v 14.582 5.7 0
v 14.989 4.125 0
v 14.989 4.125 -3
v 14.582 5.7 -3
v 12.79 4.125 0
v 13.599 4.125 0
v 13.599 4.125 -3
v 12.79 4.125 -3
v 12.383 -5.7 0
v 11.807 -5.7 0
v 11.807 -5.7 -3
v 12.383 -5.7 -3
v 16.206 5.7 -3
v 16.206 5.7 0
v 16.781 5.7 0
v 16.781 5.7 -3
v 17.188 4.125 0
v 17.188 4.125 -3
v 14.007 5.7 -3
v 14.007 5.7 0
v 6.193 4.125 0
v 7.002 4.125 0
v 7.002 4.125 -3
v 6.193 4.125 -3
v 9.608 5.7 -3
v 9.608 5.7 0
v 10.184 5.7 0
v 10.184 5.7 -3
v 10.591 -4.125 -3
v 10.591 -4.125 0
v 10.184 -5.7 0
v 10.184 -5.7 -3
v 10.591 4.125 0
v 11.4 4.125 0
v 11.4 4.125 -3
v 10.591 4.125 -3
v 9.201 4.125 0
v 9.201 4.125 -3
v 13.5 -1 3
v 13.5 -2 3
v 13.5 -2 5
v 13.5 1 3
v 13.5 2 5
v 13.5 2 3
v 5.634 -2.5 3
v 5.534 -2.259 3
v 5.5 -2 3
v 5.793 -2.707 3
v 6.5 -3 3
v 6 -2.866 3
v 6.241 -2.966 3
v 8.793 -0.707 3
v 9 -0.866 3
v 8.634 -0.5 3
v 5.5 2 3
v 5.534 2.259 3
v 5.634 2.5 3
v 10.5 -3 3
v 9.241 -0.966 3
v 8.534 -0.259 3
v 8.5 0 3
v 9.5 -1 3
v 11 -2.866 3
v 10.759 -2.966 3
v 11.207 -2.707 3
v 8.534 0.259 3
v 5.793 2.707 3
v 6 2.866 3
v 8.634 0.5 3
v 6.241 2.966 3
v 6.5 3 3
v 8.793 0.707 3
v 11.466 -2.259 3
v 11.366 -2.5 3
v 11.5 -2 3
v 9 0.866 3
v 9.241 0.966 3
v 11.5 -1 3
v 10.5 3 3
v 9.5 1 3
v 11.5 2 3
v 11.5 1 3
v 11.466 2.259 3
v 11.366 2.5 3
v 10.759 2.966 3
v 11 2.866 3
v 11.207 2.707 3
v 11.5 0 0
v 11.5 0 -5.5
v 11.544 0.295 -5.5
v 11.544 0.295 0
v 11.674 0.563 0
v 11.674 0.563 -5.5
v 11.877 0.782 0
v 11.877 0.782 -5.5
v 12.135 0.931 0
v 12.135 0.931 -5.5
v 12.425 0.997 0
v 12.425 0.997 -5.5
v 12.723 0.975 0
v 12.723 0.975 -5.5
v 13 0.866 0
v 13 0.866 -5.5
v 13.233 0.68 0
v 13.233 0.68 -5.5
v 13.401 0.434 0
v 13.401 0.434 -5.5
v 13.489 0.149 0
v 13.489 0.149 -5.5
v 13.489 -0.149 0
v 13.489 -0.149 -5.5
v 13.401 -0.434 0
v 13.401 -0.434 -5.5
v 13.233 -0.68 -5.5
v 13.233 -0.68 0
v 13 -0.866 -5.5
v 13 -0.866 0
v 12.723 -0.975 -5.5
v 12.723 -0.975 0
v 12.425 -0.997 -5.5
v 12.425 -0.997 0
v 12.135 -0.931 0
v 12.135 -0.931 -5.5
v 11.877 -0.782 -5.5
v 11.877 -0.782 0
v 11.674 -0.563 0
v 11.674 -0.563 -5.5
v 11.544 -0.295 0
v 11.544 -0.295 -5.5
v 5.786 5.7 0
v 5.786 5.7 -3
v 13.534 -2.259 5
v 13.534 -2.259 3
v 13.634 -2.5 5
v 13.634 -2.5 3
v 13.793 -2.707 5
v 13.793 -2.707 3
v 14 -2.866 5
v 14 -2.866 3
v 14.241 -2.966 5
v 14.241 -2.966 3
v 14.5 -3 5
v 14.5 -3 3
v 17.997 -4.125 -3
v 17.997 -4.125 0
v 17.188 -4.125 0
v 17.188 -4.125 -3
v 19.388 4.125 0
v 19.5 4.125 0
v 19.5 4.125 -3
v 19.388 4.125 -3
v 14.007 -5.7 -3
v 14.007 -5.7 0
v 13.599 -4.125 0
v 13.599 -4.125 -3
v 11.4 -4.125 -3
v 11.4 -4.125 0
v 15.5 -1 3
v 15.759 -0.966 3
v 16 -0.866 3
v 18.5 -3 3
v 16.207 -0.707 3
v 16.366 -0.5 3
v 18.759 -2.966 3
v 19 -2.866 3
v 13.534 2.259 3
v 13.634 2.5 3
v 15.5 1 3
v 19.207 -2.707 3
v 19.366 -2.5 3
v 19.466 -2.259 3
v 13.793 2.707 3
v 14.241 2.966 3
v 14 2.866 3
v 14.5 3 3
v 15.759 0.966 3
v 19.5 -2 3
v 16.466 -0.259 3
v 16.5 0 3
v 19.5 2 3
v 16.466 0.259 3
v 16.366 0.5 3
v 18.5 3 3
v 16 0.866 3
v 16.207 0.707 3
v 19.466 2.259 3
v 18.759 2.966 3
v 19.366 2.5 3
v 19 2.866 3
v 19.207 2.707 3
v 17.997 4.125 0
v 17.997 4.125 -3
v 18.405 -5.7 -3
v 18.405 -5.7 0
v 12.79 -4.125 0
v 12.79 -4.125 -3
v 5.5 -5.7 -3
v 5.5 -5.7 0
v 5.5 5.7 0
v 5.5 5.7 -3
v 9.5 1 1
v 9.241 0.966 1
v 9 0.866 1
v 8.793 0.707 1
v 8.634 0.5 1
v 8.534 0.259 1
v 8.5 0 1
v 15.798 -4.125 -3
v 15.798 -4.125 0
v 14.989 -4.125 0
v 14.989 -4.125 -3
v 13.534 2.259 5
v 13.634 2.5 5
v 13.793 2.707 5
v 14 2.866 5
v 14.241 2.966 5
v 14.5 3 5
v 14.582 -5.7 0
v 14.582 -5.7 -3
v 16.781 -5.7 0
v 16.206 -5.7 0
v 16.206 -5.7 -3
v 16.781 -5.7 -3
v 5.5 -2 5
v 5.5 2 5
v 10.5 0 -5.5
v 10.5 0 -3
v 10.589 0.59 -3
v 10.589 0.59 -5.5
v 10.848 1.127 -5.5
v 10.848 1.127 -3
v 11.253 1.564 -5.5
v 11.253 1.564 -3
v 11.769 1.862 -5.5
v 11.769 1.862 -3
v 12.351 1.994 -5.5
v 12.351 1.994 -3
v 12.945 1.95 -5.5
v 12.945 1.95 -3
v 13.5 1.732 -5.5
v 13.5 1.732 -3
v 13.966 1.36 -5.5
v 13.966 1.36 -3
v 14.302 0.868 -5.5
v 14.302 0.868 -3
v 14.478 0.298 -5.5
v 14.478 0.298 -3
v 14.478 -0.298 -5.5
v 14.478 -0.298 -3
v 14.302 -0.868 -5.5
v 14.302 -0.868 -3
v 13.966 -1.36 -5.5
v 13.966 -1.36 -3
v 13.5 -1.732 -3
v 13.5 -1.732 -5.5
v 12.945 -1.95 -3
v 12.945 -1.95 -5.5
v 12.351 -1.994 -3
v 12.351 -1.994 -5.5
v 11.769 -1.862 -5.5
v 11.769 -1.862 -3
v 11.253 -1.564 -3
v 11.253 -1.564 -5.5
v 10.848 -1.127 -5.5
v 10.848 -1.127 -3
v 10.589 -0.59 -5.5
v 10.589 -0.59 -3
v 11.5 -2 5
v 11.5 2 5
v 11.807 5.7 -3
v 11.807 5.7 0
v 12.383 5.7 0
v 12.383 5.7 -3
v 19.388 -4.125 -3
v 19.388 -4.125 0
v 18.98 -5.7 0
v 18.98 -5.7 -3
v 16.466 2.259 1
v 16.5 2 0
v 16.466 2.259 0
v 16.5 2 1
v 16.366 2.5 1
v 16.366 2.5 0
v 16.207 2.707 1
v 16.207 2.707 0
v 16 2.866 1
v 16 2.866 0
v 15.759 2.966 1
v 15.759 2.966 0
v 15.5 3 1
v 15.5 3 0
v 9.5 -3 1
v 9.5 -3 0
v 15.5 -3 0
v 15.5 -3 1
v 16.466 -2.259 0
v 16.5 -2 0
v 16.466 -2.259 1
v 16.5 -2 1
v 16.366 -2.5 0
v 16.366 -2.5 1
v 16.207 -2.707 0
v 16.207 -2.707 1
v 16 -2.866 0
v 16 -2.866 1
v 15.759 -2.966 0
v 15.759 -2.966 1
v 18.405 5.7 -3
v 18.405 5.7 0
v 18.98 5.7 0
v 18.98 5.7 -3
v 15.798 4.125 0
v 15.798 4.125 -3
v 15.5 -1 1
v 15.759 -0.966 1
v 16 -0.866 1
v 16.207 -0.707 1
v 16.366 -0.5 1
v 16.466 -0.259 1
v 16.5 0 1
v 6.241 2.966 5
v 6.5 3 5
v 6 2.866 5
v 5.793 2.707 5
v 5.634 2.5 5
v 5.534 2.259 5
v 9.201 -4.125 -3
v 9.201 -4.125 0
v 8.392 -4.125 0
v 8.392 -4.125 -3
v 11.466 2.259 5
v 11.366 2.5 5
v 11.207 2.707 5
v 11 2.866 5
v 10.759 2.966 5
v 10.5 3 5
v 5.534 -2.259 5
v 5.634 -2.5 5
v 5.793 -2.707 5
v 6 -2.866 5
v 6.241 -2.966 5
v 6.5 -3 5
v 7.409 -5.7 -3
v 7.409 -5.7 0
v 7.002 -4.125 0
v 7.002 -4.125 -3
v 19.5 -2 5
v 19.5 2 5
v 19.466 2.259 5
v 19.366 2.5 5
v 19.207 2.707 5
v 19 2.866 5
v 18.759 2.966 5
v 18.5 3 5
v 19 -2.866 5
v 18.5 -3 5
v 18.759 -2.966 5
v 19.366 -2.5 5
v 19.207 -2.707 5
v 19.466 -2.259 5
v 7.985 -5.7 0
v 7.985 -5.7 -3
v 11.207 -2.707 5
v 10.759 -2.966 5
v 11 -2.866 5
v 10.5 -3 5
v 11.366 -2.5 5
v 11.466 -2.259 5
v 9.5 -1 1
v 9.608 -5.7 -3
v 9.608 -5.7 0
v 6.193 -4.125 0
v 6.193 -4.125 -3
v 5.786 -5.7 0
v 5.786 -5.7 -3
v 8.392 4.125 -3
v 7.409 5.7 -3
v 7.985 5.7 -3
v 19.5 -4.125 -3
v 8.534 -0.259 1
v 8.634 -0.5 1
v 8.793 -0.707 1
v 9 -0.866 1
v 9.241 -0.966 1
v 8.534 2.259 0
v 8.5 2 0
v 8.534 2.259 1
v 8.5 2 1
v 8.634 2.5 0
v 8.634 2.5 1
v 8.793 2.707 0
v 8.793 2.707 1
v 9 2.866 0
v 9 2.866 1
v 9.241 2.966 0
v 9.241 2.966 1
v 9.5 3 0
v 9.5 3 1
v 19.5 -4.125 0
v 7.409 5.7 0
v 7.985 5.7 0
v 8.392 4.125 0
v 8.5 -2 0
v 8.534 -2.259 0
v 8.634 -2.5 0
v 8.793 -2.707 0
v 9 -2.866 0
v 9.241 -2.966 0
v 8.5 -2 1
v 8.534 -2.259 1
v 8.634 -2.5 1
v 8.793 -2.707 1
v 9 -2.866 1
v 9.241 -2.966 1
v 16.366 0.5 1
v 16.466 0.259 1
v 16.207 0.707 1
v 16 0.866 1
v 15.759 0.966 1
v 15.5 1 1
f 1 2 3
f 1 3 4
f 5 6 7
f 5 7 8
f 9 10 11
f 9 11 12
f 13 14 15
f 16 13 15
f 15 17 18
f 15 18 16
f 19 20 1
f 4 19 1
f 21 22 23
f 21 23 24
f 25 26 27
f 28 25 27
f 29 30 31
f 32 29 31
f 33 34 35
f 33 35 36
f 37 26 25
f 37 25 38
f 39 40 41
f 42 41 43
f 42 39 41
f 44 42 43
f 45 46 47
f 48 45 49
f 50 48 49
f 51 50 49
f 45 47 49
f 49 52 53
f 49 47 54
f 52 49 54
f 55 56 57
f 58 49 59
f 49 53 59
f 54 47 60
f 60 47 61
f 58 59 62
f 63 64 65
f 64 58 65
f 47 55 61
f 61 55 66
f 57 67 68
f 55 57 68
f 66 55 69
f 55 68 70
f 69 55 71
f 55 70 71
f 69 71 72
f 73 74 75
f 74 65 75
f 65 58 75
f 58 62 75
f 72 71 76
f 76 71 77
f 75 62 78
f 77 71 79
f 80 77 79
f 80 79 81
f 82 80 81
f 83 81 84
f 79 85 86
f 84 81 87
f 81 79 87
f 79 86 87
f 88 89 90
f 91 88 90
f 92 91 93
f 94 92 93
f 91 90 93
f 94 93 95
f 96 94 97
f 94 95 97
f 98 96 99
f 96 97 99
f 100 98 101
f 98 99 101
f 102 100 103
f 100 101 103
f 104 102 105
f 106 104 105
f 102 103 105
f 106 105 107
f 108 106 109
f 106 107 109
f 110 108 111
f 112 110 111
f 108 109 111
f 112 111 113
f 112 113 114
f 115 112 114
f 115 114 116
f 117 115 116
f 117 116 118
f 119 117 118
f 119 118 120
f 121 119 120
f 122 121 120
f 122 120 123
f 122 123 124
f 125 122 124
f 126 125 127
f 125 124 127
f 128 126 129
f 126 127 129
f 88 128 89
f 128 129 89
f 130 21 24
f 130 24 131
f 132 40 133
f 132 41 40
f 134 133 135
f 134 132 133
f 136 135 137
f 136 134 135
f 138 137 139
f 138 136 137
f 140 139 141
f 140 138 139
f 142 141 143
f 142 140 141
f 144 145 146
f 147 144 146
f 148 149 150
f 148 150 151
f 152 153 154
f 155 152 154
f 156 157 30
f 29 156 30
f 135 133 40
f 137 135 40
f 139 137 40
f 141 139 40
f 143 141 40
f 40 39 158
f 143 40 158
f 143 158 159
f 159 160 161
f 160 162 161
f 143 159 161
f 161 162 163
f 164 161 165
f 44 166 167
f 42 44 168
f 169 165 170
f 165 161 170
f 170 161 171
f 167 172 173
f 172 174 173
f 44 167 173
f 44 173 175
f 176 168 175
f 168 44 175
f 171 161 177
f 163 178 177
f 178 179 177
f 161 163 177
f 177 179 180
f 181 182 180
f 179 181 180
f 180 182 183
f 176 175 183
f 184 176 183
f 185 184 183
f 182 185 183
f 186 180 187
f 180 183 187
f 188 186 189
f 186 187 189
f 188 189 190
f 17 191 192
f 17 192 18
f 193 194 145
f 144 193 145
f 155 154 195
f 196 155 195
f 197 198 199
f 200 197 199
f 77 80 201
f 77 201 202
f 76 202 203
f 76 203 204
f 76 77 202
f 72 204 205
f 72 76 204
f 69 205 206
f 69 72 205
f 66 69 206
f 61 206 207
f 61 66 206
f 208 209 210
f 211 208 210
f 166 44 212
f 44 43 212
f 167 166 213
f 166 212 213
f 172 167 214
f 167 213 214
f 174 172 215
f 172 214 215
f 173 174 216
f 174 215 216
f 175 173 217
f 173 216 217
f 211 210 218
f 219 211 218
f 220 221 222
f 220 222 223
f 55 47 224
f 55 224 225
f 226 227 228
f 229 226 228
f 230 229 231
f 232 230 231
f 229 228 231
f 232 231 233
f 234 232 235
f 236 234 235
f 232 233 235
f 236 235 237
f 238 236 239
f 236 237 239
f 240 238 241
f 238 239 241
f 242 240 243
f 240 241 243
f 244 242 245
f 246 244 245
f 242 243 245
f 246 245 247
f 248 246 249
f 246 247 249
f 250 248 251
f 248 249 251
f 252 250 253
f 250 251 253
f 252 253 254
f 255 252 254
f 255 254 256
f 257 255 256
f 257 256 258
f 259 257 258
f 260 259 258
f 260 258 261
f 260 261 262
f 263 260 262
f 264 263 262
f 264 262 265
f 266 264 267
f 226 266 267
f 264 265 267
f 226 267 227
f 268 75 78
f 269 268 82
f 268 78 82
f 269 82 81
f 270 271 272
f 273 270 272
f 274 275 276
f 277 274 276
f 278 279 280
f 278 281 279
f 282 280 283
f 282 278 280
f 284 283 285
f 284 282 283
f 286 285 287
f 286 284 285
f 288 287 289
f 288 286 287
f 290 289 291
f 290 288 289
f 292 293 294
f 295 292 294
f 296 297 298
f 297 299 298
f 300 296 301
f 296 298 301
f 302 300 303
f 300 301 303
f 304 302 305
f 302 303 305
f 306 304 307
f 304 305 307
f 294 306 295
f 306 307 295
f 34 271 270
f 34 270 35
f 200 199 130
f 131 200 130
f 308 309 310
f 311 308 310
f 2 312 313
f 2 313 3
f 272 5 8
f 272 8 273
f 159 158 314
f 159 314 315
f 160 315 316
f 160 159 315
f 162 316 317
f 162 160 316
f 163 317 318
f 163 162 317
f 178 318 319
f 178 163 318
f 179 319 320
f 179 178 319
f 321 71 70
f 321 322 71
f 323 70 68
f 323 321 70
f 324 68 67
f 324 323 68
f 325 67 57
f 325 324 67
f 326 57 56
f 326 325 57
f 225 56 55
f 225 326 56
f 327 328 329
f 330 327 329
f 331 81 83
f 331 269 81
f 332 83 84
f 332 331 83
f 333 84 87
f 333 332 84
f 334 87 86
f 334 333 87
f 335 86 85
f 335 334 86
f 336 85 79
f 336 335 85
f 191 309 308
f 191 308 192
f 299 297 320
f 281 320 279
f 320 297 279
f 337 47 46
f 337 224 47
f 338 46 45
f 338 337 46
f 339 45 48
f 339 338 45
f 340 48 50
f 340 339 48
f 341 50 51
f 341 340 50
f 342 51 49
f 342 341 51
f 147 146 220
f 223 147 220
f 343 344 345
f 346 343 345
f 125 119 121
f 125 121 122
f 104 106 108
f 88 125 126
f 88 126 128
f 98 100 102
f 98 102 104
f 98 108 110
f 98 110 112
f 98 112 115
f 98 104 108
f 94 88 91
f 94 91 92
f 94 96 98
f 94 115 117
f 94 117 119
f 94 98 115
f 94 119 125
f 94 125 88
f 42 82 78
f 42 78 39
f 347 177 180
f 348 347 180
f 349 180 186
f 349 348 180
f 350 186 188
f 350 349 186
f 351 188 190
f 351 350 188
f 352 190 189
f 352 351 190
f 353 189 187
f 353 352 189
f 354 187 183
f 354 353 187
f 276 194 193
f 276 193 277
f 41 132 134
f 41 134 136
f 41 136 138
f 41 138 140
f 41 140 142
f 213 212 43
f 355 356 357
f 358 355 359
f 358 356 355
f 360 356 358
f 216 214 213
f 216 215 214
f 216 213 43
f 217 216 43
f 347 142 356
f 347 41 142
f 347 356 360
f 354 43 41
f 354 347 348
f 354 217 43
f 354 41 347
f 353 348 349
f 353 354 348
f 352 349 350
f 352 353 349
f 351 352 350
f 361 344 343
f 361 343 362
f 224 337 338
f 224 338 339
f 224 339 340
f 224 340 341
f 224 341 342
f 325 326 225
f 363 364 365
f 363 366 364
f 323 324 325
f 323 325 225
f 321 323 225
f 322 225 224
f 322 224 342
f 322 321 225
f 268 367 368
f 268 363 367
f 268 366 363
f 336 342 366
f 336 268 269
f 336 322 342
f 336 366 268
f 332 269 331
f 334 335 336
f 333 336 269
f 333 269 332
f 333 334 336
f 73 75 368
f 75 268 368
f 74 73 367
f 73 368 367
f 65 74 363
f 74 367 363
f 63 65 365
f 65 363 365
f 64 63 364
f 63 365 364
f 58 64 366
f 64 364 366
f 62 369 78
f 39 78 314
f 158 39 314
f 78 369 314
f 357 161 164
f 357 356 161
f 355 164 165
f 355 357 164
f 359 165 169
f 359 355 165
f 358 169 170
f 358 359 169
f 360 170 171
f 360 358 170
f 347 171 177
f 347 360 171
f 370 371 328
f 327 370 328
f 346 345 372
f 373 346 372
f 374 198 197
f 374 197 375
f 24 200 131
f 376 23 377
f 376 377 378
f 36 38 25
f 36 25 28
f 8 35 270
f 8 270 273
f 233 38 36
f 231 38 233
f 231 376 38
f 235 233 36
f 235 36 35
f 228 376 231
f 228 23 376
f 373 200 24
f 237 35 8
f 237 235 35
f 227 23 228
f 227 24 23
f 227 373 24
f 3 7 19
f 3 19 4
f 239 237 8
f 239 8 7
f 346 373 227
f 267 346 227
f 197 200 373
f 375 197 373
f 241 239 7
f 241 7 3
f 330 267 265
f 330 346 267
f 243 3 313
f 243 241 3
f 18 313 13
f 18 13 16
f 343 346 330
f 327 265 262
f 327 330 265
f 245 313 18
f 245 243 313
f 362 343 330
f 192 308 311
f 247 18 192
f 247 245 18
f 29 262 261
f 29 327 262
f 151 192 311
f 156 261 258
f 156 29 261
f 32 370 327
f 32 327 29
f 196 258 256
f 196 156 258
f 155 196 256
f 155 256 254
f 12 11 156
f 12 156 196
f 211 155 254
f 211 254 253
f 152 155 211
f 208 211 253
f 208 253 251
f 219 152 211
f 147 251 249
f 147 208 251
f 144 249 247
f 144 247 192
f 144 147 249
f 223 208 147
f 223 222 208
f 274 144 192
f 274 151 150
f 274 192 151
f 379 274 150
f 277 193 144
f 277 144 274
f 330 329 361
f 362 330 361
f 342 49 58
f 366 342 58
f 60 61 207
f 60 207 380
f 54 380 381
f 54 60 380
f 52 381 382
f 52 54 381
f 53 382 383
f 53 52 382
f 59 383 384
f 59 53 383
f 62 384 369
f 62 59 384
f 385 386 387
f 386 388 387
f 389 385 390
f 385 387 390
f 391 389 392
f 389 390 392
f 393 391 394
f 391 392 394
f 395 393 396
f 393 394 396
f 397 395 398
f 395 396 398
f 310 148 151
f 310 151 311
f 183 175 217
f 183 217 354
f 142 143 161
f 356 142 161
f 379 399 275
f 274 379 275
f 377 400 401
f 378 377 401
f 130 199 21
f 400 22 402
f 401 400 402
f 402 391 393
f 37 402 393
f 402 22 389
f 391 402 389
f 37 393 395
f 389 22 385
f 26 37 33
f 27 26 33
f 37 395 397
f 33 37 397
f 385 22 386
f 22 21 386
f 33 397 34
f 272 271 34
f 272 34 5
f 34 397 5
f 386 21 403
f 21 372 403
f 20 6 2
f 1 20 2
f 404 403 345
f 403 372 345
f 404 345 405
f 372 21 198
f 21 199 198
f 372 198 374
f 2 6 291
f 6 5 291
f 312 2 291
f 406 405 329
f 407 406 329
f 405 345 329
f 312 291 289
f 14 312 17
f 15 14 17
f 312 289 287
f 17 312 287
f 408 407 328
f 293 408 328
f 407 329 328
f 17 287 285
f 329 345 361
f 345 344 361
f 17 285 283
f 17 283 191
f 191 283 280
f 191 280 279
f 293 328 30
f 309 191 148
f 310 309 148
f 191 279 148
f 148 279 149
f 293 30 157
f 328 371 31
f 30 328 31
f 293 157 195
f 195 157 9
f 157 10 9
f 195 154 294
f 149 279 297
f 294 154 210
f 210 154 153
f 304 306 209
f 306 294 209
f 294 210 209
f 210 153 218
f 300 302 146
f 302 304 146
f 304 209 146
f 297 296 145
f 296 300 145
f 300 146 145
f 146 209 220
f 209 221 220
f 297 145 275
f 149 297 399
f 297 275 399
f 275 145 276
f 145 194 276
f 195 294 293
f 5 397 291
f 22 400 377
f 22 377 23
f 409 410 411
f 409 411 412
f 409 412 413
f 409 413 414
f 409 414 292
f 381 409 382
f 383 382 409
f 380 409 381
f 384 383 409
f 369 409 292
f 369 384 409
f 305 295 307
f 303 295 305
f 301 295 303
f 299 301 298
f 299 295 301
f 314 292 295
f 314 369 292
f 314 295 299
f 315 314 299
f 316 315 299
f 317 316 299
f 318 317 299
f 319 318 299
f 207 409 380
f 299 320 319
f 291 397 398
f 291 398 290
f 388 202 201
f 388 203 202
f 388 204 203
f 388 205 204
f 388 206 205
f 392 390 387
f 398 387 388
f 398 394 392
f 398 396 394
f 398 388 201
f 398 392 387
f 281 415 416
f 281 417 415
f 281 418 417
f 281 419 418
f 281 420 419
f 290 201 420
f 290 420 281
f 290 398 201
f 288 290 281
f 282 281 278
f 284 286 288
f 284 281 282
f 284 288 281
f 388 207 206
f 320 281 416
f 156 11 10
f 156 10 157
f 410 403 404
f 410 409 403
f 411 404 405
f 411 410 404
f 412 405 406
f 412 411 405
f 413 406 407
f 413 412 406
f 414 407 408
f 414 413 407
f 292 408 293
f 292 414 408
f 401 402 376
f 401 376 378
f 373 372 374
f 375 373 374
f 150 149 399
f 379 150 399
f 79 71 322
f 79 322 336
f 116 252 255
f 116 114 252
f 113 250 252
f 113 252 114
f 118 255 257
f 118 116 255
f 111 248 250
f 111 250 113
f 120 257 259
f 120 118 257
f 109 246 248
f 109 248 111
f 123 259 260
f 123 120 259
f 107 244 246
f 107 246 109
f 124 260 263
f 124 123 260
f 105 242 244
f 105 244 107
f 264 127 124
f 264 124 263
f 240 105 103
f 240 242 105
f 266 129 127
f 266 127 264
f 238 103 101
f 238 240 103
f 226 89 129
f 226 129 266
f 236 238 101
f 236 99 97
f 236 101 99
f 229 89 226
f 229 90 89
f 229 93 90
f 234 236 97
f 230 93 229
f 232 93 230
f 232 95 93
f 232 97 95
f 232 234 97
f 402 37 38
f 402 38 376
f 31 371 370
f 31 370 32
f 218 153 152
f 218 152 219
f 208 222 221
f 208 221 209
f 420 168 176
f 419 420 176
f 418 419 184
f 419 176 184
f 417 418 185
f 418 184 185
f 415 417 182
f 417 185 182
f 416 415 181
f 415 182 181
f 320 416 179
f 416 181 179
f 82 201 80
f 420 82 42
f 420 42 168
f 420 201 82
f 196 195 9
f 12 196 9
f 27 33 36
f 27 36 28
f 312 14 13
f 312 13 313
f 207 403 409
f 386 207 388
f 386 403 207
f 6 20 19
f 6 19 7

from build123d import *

# Parameters (mm, degrees)
BLANKSKE_W             = 25
BLANKSKE_H             = 5.7
BLANK_DEPTH            = 3
TOOTHCUTSIM_DEPTH      = 26.816467613
TEETHCUTS_COUNT        = 12
TEETHCUTS_PITCH        = 2.199114855
MIRROR_2_COPY_1_DEPTH  = 26.816467613
MIRROR_2_COPY_2_DEPTH  = 26.816467613
MIRROR_2_COPY_3_DEPTH  = 26.816467613
MIRROR_2_COPY_4_DEPTH  = 26.816467613
MIRROR_2_COPY_5_DEPTH  = 26.816467613
MIRROR_2_COPY_6_DEPTH  = 26.816467613
MIRROR_2_COPY_7_DEPTH  = 26.816467613
MIRROR_2_COPY_8_DEPTH  = 26.816467613
MIRROR_2_COPY_9_DEPTH  = 26.816467613
MIRROR_2_COPY_10_DEPTH = 26.816467613
MIRROR_2_COPY_11_DEPTH = 26.816467613
SKETCH_2_R             = 2
EXTRUDE_1_DEPTH        = 2.5
SKETCH_3_R             = 0.5
CUT_EXTRUDE_3_DEPTH    = 27.224797425
CUT_EXTRUDE_4_DEPTH    = 10
SKETCH_6_W             = 8
SKETCH_6_H             = 2
EXTRUDE_3_DEPTH        = 3
SKETCH_7_W             = 6
SKETCH_7_H             = 6
EXTRUDE_4_DEPTH        = 2
FILLET_1_R             = 1
FILLET_2_R             = 1
SKETCH_8_W             = 8
SKETCH_8_H             = 6
EXTRUDE_5_DEPTH        = 1
FILLET_5_R             = 1
CUT_EXTRUDE_5_DEPTH    = 24.274077912
SKETCH_10_R            = 1
CUT_EXTRUDE_6_DEPTH    = 5.5


with BuildPart() as part:
    # BlankSke → Blank (new body)
    with BuildSketch(Plane.XY):
        with Locations((12.5, 2.85)):
            Rectangle(BLANKSKE_W, BLANKSKE_H)
    blank = extrude(amount=-BLANK_DEPTH)

    # TooCutSkeSim → ToothCutSim (cut, through all)
    with BuildSketch(Plane.XY):
        Polygon((0.404488327, 4.125), (-0.404488327, 4.125), (-0.818379909, 5.7254), (0.818379909, 5.7254), align=None)
    toothcutsim = extrude(amount=-TOOTHCUTSIM_DEPTH, mode=Mode.SUBTRACT)

    # TeethCuts: ToothCutSim ×12
    with Locations(*[(i * TEETHCUTS_PITCH, 0, 0) for i in range(1, TEETHCUTS_COUNT)]):
        add(toothcutsim, mode=Mode.SUBTRACT)

    # 镜向2: Blank, ToothCutSim across plane
    add(blank.mirror(Plane(origin=(0, 0, -3), x_dir=(0, 0, 1), z_dir=(0, -1, 0))))
    add(toothcutsim.mirror(Plane(origin=(0, 0, -3), x_dir=(0, 0, 1), z_dir=(0, -1, 0))), mode=Mode.SUBTRACT)

    # 镜向2 copy 1 sketch → 镜向2 copy 1 (cut, through all)
    with BuildSketch(Plane(origin=(2.199114855, 0, 0), x_dir=(1, 0, 0), z_dir=(0, 0, 1))):
        Polygon((0.404488327, -4.125), (-0.404488327, -4.125), (-0.818379909, -5.7254), (0.818379909, -5.7254), align=None)
    extrude(amount=-MIRROR_2_COPY_1_DEPTH, mode=Mode.SUBTRACT)

    # 镜向2 copy 2 sketch → 镜向2 copy 2 (cut, through all)
    with BuildSketch(Plane(origin=(4.39822971, 0, 0), x_dir=(1, 0, 0), z_dir=(0, 0, 1))):
        Polygon((0.404488327, -4.125), (-0.404488327, -4.125), (-0.818379909, -5.7254), (0.818379909, -5.7254), align=None)
    extrude(amount=-MIRROR_2_COPY_2_DEPTH, mode=Mode.SUBTRACT)

    # 镜向2 copy 3 sketch → 镜向2 copy 3 (cut, through all)
    with BuildSketch(Plane(origin=(6.597344565, 0, 0), x_dir=(1, 0, 0), z_dir=(0, 0, 1))):
        Polygon((0.404488327, -4.125), (-0.404488327, -4.125), (-0.818379909, -5.7254), (0.818379909, -5.7254), align=None)
    extrude(amount=-MIRROR_2_COPY_3_DEPTH, mode=Mode.SUBTRACT)

    # 镜向2 copy 4 sketch → 镜向2 copy 4 (cut, through all)
    with BuildSketch(Plane(origin=(8.79645942, 0, 0), x_dir=(1, 0, 0), z_dir=(0, 0, 1))):
        Polygon((0.404488327, -4.125), (-0.404488327, -4.125), (-0.818379909, -5.7254), (0.818379909, -5.7254), align=None)
    extrude(amount=-MIRROR_2_COPY_4_DEPTH, mode=Mode.SUBTRACT)

    # 镜向2 copy 5 sketch → 镜向2 copy 5 (cut, through all)
    with BuildSketch(Plane(origin=(10.995574275, 0, 0), x_dir=(1, 0, 0), z_dir=(0, 0, 1))):
        Polygon((0.404488327, -4.125), (-0.404488327, -4.125), (-0.818379909, -5.7254), (0.818379909, -5.7254), align=None)
    extrude(amount=-MIRROR_2_COPY_5_DEPTH, mode=Mode.SUBTRACT)

    # 镜向2 copy 6 sketch → 镜向2 copy 6 (cut, through all)
    with BuildSketch(Plane(origin=(13.19468913, 0, 0), x_dir=(1, 0, 0), z_dir=(0, 0, 1))):
        Polygon((0.404488327, -4.125), (-0.404488327, -4.125), (-0.818379909, -5.7254), (0.818379909, -5.7254), align=None)
    extrude(amount=-MIRROR_2_COPY_6_DEPTH, mode=Mode.SUBTRACT)

    # 镜向2 copy 7 sketch → 镜向2 copy 7 (cut, through all)
    with BuildSketch(Plane(origin=(15.393803985, 0, 0), x_dir=(1, 0, 0), z_dir=(0, 0, 1))):
        Polygon((0.404488327, -4.125), (-0.404488327, -4.125), (-0.818379909, -5.7254), (0.818379909, -5.7254), align=None)
    extrude(amount=-MIRROR_2_COPY_7_DEPTH, mode=Mode.SUBTRACT)

    # 镜向2 copy 8 sketch → 镜向2 copy 8 (cut, through all)
    with BuildSketch(Plane(origin=(17.59291884, 0, 0), x_dir=(1, 0, 0), z_dir=(0, 0, 1))):
        Polygon((0.404488327, -4.125), (-0.404488327, -4.125), (-0.818379909, -5.7254), (0.818379909, -5.7254), align=None)
    extrude(amount=-MIRROR_2_COPY_8_DEPTH, mode=Mode.SUBTRACT)

    # 镜向2 copy 9 sketch → 镜向2 copy 9 (cut, through all)
    with BuildSketch(Plane(origin=(19.792033695, 0, 0), x_dir=(1, 0, 0), z_dir=(0, 0, 1))):
        Polygon((0.404488327, -4.125), (-0.404488327, -4.125), (-0.818379909, -5.7254), (0.818379909, -5.7254), align=None)
    extrude(amount=-MIRROR_2_COPY_9_DEPTH, mode=Mode.SUBTRACT)

    # 镜向2 copy 10 sketch → 镜向2 copy 10 (cut, through all)
    with BuildSketch(Plane(origin=(21.99114855, 0, 0), x_dir=(1, 0, 0), z_dir=(0, 0, 1))):
        Polygon((0.404488327, -4.125), (-0.404488327, -4.125), (-0.818379909, -5.7254), (0.818379909, -5.7254), align=None)
    extrude(amount=-MIRROR_2_COPY_10_DEPTH, mode=Mode.SUBTRACT)

    # 镜向2 copy 11 sketch → 镜向2 copy 11 (cut, through all)
    with BuildSketch(Plane(origin=(24.190263405, 0, 0), x_dir=(1, 0, 0), z_dir=(0, 0, 1))):
        Polygon((0.404488327, -4.125), (-0.404488327, -4.125), (-0.818379909, -5.7254), (0.818379909, -5.7254), align=None)
    extrude(amount=-MIRROR_2_COPY_11_DEPTH, mode=Mode.SUBTRACT)

    # 草图2 → 凸台-拉伸1 (add)
    with BuildSketch(Plane(origin=(0, 0, -3), x_dir=(-1, 0, 0), z_dir=(0, 0, -1))):
        with Locations((-12.5, 0)):
            Circle(SKETCH_2_R)
    extrude(amount=EXTRUDE_1_DEPTH)

    # 草图3 → 切除-拉伸3 (cut, through all)
    with BuildSketch(Plane(origin=(0, 0, -5.5), x_dir=(-1, 0, 0), z_dir=(0, 0, -1))):
        with Locations((-12.5, 0)):
            Circle(SKETCH_3_R)
    extrude(amount=-CUT_EXTRUDE_3_DEPTH, mode=Mode.SUBTRACT)

    # 草图4 → 切除-拉伸4 (cut)
    with BuildSketch(Plane(origin=(0, 0, -3), x_dir=(-1, 0, 0), z_dir=(0, 0, -1))):
        Polygon((-21.884759598, 2.149584132), (-21.884759598, -2.149584132), (-21.884759598, -6.579197657), (-25.677355537, -6.579197657), (-25.677355537, 5.959830346), (-21.884759598, 5.959830346), align=None)
        Polygon((-2.5, 4.125), (-2.5, -4.125), (-2.5, -6.073591689), (0, -6.073591689), (0, 6.402235568), (-2.5, 6.402235568), align=None)
    extrude(amount=-CUT_EXTRUDE_4_DEPTH, mode=Mode.SUBTRACT)

    # 草图6 → 凸台-拉伸3 (add)
    with BuildSketch(Plane.XY):
        with Locations((12.5, 0)):
            Rectangle(SKETCH_6_W, SKETCH_6_H)
    extrude(amount=EXTRUDE_3_DEPTH)

    # 草图7 → 凸台-拉伸4 (add)
    with BuildSketch(Plane.XY.offset(3)):
        with Locations((8.5, 0)):
            Rectangle(SKETCH_7_W, SKETCH_7_H)
        with Locations((16.5, 0)):
            Rectangle(SKETCH_7_W, SKETCH_7_H)
    extrude(amount=EXTRUDE_4_DEPTH)

    # 圆角1
    fillet_1_edges = [part.edges().sort_by_distance(p)[0] for p in [
        (16.5, -1, 1.5),
        (8.5, -1, 1.5),
        (16.5, 1, 1.5),
        (8.5, 1, 1.5),
    ]]
    fillet(fillet_1_edges, radius=FILLET_1_R - 0.0001)  # a hair under: the kernel refuses the full size

    # 圆角2
    fillet_2_edges = [part.edges().sort_by_distance(p)[0] for p in [
        (5.5, 3, 4),
        (5.5, -3, 4),
        (11.5, -3, 4),
        (11.5, 3, 4),
        (19.5, 3, 4),
        (13.5, 3, 4),
        (13.5, -3, 4),
        (19.5, -3, 4),
    ]]
    fillet(fillet_2_edges, radius=FILLET_2_R)

    # 草图8 → 凸台-拉伸5 (add)
    with BuildSketch(Plane.XY):
        with Locations((12.5, 0)):
            Rectangle(SKETCH_8_W, SKETCH_8_H)
    extrude(amount=EXTRUDE_5_DEPTH)

    # 圆角5
    fillet_5_edges = [part.edges().sort_by_distance(p)[0] for p in [
        (16.5, -3, 0.5),
        (8.5, 3, 0.5),
        (16.5, 3, 0.5),
        (8.5, -3, 0.5),
    ]]
    fillet(fillet_5_edges, radius=FILLET_5_R)

    # 草图9 → 切除-拉伸5 (cut, through all)
    with BuildSketch(Plane.XY):
        Polygon((5.5, 0), (5.5, -6.223195751), (2.23821655, -6.223195751), (2.23821655, 6.249606369), (5.5, 6.249606369), align=None)
        Polygon((19.5, 0), (19.5, -6.223195751), (22.40634716, -6.223195751), (22.40634716, 6.249606369), (19.5, 6.249606369), align=None)
    extrude(amount=-CUT_EXTRUDE_5_DEPTH, mode=Mode.SUBTRACT)

    # 草图10 → 切除-拉伸6 (cut)
    with BuildSketch(Plane(origin=(0, 0, -5.5), x_dir=(-1, 0, 0), z_dir=(0, 0, -1))):
        with Locations((-12.5, 0)):
            Circle(SKETCH_10_R)
    extrude(amount=-CUT_EXTRUDE_6_DEPTH, mode=Mode.SUBTRACT)


solid = part.part
